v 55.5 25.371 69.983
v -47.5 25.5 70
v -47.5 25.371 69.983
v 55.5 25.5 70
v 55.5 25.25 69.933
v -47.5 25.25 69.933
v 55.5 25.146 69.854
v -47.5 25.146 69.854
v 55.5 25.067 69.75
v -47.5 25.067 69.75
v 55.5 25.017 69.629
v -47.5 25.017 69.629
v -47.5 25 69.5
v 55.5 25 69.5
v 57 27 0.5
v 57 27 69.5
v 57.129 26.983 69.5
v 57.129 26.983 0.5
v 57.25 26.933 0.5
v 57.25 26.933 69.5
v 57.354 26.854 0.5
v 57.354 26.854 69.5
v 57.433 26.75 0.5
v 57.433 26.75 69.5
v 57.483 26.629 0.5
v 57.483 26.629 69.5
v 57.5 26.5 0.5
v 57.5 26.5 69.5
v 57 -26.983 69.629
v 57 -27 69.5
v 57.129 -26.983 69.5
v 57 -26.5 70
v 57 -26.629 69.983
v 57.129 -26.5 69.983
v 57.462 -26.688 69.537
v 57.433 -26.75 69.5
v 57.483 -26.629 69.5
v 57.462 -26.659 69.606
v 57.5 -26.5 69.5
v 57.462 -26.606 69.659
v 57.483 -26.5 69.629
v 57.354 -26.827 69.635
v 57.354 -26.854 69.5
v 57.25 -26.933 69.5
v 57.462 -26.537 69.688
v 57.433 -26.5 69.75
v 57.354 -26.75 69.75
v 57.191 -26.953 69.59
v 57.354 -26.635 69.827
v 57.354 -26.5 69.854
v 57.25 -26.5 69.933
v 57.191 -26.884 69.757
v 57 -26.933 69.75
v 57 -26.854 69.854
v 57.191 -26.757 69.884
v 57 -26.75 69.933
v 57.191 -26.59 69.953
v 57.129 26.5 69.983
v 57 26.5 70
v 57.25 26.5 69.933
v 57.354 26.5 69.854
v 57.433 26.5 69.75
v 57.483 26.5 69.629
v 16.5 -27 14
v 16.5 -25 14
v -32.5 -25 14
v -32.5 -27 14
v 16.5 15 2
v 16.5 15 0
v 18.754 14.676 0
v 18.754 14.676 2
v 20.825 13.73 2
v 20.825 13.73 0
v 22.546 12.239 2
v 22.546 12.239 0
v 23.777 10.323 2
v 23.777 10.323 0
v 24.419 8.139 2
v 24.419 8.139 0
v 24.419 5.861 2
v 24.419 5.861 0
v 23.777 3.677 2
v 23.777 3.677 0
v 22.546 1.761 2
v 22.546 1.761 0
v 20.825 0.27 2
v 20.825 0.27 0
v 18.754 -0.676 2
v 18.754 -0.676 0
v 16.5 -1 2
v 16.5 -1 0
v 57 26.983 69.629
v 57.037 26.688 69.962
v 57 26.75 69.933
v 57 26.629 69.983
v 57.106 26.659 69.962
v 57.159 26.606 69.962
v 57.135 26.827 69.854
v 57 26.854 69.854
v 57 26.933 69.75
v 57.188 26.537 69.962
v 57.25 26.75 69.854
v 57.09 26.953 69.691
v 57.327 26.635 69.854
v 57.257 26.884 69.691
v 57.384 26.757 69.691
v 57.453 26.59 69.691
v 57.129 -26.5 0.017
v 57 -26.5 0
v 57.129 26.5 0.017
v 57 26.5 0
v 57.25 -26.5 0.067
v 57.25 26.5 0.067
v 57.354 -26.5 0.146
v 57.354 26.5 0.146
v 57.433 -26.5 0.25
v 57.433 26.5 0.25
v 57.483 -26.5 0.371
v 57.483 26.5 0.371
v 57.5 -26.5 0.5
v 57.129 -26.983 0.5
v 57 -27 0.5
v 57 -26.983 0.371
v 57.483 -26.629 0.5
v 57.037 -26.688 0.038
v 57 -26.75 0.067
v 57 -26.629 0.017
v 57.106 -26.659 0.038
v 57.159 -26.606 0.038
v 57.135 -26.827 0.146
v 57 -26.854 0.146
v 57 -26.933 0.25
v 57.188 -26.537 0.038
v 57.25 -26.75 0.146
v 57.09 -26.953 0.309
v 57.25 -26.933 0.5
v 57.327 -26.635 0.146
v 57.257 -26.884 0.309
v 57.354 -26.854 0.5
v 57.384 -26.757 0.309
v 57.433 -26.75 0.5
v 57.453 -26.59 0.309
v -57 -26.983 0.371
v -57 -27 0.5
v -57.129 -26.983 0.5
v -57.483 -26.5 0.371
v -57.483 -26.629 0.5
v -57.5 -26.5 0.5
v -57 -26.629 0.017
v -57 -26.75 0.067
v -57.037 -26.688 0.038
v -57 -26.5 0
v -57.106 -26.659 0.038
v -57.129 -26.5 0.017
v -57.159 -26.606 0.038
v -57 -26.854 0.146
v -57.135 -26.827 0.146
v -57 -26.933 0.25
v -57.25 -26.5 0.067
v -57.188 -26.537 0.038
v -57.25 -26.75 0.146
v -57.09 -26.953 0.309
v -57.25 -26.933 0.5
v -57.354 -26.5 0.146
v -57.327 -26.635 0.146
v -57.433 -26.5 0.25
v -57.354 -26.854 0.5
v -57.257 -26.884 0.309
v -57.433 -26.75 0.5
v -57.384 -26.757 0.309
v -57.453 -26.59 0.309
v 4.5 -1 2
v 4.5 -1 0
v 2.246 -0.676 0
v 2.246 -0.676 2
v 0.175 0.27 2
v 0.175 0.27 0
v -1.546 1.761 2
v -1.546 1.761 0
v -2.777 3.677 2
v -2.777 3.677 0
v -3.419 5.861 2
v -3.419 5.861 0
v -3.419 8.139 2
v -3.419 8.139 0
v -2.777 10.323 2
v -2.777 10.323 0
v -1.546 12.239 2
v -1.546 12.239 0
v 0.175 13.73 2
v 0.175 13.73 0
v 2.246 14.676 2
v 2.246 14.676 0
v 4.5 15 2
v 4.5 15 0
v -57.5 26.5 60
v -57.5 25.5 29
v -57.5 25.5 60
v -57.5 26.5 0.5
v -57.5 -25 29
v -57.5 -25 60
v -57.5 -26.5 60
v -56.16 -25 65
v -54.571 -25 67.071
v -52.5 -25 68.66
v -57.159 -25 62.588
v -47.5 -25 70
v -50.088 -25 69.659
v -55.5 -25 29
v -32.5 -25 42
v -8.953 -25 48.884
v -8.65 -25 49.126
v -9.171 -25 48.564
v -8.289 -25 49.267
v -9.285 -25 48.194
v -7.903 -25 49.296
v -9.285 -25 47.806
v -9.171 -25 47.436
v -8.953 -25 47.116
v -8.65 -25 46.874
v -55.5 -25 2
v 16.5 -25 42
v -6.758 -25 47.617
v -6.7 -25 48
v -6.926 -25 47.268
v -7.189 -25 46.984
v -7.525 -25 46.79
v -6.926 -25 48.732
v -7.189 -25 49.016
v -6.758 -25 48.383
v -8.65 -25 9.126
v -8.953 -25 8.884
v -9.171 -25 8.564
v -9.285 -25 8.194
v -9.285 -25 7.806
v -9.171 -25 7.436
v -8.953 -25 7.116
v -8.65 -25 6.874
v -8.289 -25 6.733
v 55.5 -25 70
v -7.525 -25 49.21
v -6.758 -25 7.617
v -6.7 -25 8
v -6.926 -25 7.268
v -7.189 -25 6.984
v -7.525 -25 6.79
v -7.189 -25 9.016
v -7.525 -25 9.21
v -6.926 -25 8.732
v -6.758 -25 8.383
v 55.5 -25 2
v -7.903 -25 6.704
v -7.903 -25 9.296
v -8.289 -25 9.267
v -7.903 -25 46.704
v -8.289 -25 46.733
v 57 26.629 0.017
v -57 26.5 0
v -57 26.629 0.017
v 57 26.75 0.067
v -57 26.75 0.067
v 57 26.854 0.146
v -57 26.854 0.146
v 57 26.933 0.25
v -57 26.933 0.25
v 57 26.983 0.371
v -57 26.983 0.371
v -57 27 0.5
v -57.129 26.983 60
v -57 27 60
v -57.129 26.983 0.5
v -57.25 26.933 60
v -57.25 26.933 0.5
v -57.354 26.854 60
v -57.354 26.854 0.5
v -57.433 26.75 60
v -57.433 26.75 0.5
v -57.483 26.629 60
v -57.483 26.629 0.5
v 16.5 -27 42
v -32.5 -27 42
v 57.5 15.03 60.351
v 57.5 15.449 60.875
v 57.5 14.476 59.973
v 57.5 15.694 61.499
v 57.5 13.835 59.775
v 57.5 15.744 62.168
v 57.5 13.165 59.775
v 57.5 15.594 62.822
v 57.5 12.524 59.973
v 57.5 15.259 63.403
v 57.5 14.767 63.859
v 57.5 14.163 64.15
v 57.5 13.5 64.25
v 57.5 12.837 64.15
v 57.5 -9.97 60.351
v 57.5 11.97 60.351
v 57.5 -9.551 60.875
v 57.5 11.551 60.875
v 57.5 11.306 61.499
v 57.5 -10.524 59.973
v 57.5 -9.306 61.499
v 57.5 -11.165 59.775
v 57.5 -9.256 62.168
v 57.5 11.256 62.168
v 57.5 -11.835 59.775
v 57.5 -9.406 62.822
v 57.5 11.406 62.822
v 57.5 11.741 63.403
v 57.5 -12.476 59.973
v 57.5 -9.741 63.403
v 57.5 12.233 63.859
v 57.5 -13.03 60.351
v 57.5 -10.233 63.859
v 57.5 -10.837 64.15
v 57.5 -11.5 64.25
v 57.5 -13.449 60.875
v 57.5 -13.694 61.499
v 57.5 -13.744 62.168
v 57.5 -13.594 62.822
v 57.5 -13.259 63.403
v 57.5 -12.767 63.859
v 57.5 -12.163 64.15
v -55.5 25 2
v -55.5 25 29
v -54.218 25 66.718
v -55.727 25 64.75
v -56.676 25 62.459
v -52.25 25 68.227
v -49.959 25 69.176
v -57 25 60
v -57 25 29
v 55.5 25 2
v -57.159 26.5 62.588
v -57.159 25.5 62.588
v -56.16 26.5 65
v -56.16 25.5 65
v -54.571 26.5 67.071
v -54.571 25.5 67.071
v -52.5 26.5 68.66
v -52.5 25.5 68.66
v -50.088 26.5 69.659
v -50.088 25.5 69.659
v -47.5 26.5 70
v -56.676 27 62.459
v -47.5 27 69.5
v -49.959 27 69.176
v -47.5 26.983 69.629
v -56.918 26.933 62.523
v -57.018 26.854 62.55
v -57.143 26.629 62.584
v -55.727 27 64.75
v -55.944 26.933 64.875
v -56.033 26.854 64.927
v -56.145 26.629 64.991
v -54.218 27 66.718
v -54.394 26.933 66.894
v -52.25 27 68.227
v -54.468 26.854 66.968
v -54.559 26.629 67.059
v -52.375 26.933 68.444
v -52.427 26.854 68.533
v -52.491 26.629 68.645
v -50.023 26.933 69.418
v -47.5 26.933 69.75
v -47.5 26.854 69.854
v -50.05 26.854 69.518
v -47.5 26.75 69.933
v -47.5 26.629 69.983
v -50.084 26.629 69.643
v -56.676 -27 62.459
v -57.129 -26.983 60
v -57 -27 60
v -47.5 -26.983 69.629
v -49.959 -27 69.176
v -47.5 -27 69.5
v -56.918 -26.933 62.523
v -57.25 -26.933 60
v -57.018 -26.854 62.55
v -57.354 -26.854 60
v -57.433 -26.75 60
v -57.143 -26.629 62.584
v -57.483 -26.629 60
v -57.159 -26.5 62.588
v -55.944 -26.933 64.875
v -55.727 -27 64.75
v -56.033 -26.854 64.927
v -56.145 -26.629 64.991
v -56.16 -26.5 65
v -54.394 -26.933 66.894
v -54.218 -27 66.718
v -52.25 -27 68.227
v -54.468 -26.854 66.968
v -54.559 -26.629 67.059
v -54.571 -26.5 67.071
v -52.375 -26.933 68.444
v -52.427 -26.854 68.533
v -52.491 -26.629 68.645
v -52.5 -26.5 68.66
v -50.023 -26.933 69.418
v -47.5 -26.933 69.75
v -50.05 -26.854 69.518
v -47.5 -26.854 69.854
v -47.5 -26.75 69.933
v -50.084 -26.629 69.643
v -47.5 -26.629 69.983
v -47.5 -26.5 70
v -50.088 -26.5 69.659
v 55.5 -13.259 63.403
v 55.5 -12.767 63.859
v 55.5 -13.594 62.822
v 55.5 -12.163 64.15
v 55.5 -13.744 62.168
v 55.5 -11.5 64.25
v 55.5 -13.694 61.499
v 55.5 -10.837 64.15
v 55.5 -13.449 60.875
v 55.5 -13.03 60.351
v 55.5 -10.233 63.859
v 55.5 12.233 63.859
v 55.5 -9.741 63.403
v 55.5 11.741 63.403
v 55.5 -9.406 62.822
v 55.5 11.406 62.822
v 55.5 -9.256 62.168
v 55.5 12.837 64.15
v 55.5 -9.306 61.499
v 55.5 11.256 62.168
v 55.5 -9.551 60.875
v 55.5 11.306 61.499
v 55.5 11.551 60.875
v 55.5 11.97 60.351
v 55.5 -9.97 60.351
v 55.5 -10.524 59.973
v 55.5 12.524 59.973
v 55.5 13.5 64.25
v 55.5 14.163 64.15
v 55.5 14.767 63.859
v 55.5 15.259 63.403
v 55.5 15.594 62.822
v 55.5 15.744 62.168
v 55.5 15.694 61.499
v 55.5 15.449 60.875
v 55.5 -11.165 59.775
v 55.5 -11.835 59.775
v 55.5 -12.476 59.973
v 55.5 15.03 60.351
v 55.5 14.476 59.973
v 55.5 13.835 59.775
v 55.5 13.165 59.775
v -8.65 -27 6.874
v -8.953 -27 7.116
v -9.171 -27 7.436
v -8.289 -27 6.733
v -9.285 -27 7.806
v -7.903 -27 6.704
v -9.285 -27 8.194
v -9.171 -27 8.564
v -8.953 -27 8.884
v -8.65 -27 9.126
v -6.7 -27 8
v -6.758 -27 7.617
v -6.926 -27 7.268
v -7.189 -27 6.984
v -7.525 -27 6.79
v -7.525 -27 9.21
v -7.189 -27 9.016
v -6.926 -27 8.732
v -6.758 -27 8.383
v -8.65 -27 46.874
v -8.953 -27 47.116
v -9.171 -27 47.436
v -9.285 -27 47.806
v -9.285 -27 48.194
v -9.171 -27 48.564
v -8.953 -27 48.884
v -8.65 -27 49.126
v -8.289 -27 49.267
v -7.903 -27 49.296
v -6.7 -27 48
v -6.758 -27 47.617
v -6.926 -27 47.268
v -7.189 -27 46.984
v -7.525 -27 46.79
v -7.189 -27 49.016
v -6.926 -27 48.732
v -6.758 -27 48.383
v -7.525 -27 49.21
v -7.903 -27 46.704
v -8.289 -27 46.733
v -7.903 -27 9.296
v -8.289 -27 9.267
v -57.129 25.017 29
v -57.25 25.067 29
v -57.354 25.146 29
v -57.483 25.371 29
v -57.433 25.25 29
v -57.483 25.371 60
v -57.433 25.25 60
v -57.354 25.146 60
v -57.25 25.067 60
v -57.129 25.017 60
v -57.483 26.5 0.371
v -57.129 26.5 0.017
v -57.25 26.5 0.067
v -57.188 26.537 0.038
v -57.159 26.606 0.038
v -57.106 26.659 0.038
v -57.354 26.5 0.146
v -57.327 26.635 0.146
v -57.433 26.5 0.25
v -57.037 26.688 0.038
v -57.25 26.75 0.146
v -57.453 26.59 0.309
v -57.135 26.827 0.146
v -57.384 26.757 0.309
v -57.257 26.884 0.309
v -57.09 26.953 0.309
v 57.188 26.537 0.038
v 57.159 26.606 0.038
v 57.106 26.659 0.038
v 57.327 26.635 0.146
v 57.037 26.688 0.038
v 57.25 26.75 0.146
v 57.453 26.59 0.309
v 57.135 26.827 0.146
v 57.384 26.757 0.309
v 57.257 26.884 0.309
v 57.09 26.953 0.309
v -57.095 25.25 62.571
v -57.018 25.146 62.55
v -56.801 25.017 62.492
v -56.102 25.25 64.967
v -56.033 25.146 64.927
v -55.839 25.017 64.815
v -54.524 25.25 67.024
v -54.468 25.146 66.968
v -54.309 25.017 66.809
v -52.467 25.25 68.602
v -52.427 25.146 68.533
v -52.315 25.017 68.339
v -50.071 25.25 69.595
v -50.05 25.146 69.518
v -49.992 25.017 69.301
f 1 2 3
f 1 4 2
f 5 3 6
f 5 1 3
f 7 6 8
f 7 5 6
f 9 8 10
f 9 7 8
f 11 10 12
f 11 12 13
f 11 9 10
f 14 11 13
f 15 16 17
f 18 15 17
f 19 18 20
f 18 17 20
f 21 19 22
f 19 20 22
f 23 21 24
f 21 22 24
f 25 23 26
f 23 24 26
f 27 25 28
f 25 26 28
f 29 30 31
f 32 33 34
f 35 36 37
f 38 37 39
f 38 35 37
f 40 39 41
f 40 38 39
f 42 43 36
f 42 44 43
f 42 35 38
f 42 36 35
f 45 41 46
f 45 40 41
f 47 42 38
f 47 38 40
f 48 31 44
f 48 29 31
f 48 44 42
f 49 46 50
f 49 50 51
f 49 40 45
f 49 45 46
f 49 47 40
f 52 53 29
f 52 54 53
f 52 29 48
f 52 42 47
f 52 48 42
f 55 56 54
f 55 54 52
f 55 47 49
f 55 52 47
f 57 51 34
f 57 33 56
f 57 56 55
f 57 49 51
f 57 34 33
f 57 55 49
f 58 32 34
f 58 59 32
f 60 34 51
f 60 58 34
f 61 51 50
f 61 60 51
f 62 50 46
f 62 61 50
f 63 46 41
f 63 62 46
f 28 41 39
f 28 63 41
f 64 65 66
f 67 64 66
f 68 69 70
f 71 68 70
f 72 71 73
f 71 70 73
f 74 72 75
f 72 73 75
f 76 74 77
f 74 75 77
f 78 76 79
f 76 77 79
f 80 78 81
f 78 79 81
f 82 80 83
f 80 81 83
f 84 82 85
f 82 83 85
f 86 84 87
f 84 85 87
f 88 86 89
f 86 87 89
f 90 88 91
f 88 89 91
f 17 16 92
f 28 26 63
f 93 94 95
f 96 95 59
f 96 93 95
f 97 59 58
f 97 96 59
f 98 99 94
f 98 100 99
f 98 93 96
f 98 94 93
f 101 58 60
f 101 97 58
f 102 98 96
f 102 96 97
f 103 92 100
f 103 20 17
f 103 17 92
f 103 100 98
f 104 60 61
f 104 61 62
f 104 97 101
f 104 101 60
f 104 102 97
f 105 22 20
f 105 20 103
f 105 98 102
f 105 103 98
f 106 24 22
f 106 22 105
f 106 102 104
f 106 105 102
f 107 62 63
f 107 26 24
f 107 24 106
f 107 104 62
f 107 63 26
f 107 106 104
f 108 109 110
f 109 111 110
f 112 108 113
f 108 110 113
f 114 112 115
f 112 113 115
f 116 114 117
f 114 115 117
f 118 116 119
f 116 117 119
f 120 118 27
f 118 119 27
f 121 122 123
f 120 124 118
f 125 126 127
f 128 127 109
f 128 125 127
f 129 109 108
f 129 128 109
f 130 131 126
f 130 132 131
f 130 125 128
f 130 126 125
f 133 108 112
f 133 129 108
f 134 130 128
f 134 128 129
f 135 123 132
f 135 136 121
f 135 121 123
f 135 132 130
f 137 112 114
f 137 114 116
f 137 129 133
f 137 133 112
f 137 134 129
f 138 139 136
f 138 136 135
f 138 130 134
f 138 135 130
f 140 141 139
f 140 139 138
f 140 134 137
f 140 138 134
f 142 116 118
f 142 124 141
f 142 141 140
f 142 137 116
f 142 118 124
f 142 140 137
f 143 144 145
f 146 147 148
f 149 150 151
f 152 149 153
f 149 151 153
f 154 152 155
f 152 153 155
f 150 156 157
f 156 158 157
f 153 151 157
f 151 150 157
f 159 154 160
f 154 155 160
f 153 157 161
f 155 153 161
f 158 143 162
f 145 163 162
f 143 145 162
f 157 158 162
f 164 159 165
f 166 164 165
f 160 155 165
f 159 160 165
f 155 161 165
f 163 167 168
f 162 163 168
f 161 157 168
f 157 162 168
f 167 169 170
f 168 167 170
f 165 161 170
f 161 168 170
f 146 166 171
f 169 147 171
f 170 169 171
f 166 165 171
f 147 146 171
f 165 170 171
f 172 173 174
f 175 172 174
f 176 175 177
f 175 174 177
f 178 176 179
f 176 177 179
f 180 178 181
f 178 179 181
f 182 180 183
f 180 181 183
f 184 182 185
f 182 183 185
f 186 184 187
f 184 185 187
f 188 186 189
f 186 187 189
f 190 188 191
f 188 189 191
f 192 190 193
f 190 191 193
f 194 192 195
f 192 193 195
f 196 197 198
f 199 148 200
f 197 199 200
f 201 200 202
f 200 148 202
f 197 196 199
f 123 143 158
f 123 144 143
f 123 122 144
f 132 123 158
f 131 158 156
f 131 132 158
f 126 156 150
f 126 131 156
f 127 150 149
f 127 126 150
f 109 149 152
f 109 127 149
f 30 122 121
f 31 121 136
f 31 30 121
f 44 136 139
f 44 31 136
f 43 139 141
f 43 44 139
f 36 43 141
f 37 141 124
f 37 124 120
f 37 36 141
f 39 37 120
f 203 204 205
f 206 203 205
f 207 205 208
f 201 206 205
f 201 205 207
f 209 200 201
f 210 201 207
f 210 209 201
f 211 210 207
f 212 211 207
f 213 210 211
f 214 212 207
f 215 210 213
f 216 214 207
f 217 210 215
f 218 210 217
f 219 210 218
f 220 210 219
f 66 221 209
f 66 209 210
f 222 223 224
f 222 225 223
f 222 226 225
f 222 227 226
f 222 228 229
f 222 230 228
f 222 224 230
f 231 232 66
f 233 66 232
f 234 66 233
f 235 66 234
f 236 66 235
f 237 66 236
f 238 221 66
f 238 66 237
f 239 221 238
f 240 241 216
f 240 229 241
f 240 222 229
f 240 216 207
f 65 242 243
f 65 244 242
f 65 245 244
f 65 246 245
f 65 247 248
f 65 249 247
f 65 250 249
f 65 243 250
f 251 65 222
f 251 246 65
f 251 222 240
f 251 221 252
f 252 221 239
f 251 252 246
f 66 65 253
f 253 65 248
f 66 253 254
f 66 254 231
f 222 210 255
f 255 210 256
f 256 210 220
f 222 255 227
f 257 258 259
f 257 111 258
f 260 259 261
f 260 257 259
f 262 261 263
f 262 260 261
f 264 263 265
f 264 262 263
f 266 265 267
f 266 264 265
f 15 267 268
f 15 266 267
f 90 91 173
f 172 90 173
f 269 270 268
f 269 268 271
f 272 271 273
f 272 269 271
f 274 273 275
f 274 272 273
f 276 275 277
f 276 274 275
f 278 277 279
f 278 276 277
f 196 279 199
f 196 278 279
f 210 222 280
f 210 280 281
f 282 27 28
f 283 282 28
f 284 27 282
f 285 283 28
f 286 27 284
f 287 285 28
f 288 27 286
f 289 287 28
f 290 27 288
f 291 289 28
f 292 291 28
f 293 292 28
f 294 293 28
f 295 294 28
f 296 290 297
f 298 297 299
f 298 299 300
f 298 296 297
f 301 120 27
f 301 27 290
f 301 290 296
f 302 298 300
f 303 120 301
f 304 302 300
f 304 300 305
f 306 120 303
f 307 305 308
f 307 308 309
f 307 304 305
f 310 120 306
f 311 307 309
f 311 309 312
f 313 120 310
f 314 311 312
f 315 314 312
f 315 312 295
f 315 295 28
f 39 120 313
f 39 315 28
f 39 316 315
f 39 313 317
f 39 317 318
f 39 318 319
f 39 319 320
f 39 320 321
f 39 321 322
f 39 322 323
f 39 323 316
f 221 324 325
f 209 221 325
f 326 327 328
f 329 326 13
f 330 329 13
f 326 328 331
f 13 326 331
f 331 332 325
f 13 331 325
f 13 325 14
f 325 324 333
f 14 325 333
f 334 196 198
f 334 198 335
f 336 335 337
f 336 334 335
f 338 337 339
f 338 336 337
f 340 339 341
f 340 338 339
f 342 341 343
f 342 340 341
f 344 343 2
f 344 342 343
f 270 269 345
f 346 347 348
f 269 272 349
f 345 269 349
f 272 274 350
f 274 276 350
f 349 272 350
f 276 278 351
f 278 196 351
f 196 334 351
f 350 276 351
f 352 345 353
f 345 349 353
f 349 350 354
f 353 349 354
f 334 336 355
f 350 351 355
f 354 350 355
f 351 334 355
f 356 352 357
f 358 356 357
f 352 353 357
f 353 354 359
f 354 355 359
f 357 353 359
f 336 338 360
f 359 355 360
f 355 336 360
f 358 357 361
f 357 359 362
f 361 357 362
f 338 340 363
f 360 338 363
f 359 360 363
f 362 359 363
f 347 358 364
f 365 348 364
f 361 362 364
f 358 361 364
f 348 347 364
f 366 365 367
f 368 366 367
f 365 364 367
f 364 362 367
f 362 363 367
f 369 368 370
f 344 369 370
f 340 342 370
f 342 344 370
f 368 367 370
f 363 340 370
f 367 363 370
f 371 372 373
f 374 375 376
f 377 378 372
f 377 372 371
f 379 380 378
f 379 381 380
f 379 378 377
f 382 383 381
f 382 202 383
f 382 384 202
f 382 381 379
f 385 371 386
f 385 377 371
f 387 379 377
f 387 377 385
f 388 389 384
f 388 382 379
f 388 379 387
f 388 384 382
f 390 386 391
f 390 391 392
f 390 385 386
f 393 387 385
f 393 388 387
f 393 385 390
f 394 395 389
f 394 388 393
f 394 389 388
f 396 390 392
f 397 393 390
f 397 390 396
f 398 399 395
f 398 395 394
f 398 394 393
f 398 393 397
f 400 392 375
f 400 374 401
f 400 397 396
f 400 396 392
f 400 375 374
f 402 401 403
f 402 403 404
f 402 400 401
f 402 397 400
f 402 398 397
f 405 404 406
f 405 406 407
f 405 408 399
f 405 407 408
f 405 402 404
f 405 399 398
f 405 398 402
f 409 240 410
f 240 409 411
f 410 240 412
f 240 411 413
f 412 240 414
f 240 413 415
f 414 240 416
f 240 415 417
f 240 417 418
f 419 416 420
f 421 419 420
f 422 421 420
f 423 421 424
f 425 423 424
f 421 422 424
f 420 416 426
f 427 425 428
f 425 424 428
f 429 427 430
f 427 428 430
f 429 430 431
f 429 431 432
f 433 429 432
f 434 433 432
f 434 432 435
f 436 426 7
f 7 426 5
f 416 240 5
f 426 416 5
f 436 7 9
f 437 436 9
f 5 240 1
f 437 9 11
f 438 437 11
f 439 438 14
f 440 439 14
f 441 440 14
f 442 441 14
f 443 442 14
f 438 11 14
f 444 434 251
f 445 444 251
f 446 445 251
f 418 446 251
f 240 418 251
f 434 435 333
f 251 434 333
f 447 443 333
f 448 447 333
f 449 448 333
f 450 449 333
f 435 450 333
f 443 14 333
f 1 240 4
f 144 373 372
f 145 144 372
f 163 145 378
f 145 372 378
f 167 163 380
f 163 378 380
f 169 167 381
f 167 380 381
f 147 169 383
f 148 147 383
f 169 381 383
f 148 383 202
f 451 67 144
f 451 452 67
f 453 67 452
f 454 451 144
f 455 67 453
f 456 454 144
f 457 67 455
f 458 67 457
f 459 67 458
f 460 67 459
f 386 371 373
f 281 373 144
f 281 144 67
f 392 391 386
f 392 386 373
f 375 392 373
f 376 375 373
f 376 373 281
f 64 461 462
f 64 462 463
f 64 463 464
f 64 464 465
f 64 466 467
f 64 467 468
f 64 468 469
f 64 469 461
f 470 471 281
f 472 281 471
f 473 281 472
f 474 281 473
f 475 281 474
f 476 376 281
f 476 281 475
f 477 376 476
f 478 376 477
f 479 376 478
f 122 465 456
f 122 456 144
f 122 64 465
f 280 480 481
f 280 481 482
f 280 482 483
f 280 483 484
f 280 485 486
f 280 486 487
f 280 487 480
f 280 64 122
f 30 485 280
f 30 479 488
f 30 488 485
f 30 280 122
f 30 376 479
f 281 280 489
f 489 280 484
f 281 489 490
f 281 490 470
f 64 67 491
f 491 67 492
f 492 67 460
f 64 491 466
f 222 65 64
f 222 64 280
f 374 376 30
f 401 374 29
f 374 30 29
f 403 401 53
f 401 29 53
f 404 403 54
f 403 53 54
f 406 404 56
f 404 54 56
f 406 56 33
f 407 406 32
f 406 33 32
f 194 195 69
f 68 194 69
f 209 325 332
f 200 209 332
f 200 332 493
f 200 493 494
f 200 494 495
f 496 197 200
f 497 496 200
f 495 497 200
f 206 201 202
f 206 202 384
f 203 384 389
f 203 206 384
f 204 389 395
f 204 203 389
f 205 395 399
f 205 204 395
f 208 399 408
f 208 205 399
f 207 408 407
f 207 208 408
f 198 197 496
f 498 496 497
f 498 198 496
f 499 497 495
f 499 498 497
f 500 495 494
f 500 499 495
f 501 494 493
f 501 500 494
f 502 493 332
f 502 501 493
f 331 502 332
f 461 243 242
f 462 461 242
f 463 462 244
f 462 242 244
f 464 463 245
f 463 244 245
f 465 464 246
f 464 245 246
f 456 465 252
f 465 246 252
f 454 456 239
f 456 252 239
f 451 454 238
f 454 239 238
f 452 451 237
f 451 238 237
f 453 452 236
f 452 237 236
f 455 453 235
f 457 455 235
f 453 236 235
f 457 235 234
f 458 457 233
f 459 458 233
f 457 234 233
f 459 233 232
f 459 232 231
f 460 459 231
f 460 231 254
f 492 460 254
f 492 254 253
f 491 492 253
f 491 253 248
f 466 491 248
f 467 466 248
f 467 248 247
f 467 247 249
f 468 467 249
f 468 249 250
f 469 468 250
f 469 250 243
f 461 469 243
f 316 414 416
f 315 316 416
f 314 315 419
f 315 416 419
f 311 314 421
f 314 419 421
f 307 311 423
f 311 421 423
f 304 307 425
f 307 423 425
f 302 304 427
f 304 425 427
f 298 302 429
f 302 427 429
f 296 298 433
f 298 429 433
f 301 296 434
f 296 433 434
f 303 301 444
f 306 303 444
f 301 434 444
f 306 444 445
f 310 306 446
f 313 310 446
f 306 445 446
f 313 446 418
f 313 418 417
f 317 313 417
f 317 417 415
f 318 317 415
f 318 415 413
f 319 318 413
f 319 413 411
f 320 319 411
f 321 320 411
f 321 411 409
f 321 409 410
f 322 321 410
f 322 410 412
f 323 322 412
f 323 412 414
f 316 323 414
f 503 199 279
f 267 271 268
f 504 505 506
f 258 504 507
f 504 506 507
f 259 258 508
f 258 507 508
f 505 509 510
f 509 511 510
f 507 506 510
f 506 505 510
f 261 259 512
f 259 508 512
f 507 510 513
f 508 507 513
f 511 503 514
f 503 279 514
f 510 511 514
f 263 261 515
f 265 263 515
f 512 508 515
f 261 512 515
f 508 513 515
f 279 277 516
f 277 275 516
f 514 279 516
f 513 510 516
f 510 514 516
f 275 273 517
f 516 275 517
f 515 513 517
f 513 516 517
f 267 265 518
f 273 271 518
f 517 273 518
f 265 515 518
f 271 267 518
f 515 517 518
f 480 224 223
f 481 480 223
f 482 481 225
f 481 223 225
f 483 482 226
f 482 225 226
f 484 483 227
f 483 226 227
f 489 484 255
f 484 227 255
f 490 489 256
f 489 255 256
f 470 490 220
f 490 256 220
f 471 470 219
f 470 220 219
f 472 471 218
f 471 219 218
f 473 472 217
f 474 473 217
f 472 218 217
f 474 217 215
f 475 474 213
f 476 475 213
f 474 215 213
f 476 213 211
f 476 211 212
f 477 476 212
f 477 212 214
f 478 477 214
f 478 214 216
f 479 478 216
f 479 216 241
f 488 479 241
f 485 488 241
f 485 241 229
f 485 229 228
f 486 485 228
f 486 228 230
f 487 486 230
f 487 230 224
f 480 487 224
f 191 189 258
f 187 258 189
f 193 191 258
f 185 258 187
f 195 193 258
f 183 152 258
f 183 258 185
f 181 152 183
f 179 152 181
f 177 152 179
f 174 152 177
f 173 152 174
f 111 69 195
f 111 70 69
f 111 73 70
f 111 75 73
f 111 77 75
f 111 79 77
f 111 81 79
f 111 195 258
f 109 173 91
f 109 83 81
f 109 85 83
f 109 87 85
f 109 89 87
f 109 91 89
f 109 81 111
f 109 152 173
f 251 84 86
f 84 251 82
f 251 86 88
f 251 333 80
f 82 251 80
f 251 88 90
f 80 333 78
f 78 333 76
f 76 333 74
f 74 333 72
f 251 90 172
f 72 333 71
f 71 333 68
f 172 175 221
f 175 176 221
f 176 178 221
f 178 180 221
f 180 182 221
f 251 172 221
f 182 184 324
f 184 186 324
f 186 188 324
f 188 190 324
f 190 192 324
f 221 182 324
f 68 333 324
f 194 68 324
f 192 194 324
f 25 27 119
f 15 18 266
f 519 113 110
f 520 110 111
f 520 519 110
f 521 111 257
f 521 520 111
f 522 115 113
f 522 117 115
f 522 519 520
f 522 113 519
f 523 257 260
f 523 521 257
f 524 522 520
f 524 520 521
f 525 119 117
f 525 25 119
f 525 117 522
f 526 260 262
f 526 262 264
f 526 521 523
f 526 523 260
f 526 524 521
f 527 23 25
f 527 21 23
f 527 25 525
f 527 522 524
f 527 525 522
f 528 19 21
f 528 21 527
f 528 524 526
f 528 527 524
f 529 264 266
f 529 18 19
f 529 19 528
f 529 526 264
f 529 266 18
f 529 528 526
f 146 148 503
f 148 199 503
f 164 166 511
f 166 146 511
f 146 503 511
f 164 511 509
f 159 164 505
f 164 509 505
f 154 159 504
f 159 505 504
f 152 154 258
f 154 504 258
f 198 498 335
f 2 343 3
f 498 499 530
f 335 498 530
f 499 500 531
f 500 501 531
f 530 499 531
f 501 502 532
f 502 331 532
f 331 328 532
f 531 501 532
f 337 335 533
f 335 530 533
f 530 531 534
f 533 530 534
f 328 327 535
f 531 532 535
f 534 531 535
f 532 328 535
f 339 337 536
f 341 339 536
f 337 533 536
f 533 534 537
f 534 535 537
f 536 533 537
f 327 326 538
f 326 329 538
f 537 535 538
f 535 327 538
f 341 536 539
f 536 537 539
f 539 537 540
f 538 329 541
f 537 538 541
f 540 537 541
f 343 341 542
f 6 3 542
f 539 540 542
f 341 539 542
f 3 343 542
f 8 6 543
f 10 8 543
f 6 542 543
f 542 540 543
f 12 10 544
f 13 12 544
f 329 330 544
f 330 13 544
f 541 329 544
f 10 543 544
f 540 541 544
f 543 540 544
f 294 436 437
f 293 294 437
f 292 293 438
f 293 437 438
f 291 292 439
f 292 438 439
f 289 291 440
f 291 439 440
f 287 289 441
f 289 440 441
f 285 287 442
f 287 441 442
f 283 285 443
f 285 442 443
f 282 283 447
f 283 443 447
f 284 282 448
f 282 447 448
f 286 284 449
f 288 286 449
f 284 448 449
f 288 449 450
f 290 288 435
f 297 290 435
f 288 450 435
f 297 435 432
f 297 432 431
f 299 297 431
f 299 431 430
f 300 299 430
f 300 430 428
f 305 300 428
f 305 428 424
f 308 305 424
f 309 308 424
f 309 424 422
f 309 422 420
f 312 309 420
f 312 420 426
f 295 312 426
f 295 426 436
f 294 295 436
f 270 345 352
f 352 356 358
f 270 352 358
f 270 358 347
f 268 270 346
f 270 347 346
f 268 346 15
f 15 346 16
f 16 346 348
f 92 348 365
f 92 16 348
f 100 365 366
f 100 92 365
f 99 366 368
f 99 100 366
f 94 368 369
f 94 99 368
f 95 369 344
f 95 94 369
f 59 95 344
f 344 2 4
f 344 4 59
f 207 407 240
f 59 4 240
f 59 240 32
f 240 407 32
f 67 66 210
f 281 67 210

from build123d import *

# Parameters (mm, degrees)
CROQUIS1_W                          = 115
CROQUIS1_H                          = 70
SALIENTE_EXTRUIR1_DEPTH             = 54
CORTAR_EXTRUIR1_DEPTH               = 50
CROQUIS3_W                          = 49
CROQUIS3_H                          = 28
CORTAR_EXTRUIR2_DEPTH               = 105.452142151
CORTAR_EXTRUIR3_DEPTH               = 95.526451324
DI_METRO_DE_TALADRO_4_5_4_5_1_D     = 4.5
DI_METRO_DE_TALADRO_4_5_4_5_1_DEPTH = 115
DI_METRO_DE_TALADRO_2_6_2_6_1_D     = 2.6
DI_METRO_DE_TALADRO_2_6_2_6_1_DEPTH = 2
REDONDEO1_R                         = 10
REDONDEO2_R                         = 0.5


with BuildPart() as part:
    # Croquis1 → Saliente-Extruir1 (new body)
    with BuildSketch(Plane.XZ.offset(27)):
        with Locations((0, 35)):
            Rectangle(CROQUIS1_W, CROQUIS1_H)
    extrude(amount=-SALIENTE_EXTRUIR1_DEPTH)

    # Croquis2 → Cortar-Extruir1 (cut)
    with BuildSketch(Plane(origin=(0, 25, 0), x_dir=(1, 0, 0), z_dir=(0, 1, 0))):
        Polygon((-57.5, -29), (-57.5, -70), (55.5, -70), (55.5, -2), (-55.5, -2), (-55.5, -29), align=None)
    extrude(amount=-CORTAR_EXTRUIR1_DEPTH, mode=Mode.SUBTRACT)

    # Croquis3 → Cortar-Extruir2 (cut, through all)
    with BuildSketch(Plane(origin=(0, -25, 0), x_dir=(-1, 0, 0), z_dir=(0, 1, 0))):
        with Locations((8, 28)):
            Rectangle(CROQUIS3_W, CROQUIS3_H)
    extrude(amount=-CORTAR_EXTRUIR2_DEPTH, mode=Mode.SUBTRACT)

    # Croquis4 → Cortar-Extruir3 (cut, through all)
    with BuildSketch(Plane(origin=(0, 0, 0), x_dir=(-1, 0, 0), z_dir=(0, 0, -1))):
        with BuildLine():
            Line((-4.5, 15), (-16.5, 15))
            ThreePointArc((-16.5, 15), (-24.5, 7), (-16.5, -1))
            Line((-16.5, -1), (-4.5, -1))
            ThreePointArc((-4.5, -1), (3.5, 7), (-4.5, 15))
        make_face()
    extrude(amount=-CORTAR_EXTRUIR3_DEPTH, mode=Mode.SUBTRACT)

    # Diámetro de taladro Ø4.5 (4.5)1
    with Locations(Plane(origin=(57.5, 0, 0), x_dir=(0, 0, -1), z_dir=(1, 0, 0))):
        with Locations((-62, -11.5), (-62, 13.5)):
            Hole(DI_METRO_DE_TALADRO_4_5_4_5_1_D / 2, depth=DI_METRO_DE_TALADRO_4_5_4_5_1_DEPTH)

    # Diámetro de taladro Ø2.6 (2.6)1
    with Locations(Plane(origin=(0, -27, 0), x_dir=(-1, 0, 0), z_dir=(0, -1, 0))):
        with Locations((8, -48), (8, -8)):
            Hole(DI_METRO_DE_TALADRO_2_6_2_6_1_D / 2, depth=DI_METRO_DE_TALADRO_2_6_2_6_1_DEPTH)

    # Redondeo1
    redondeo1_edges = [part.edges().sort_by_distance(p)[0] for p in [
        (-57.5, -26, 70),
        (-57.5, 26, 70),
    ]]
    fillet(redondeo1_edges, radius=REDONDEO1_R)

    # Redondeo2
    redondeo2_edges = [part.edges().sort_by_distance(p)[0] for p in [
        (57.5, 27, 35),
        (5, 27, 70),
        (-57.5, 25, 44.5),
        (5, -27, 70),
        (57.5, -27, 35),
        (0, -27, 0),
        (57.5, 0, 70),
        (57.5, 0, 0),
        (-57.5, 0, 0),
        (0, 27, 0),
        (4, 25, 70),
        (-54.571067812, 25, 67.071067812),
        (-57.5, 27, 30),
        (-57.5, -27, 30),
        (-54.571067812, 27, 67.071067812),
        (-54.571067812, -27, 67.071067812),
    ]]
    fillet(redondeo2_edges, radius=REDONDEO2_R)


solid = part.part
